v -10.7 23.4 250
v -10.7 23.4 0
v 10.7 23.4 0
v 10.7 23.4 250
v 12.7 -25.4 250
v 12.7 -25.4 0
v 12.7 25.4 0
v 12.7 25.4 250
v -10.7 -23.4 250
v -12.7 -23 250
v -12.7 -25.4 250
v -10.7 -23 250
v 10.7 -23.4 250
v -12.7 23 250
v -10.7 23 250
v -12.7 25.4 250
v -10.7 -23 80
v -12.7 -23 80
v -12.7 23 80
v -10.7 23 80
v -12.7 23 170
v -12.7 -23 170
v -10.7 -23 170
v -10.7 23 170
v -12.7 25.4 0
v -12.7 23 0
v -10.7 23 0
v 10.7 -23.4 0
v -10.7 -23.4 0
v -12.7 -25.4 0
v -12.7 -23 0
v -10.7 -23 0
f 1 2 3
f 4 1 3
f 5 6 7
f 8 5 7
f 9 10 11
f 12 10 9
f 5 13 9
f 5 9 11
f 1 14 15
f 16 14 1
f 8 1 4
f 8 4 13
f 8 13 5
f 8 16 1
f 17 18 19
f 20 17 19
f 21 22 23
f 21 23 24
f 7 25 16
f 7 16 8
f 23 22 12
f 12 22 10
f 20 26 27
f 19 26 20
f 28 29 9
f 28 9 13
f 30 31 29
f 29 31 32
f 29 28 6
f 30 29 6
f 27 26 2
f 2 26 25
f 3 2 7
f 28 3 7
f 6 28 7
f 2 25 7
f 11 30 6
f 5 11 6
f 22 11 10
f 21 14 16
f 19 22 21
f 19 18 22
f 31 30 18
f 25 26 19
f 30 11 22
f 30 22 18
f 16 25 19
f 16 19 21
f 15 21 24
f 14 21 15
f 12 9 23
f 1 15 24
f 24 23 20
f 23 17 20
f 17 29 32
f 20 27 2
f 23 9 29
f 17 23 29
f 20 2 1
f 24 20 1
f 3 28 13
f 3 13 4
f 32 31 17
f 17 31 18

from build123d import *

# Parameters (mm, degrees)
SKETCH1_W           = 25.4
SKETCH1_H           = 50.8
SKETCH1_W_2         = 21.4
SKETCH1_H_2         = 46.8
BOSS_EXTRUDE1_DEPTH = 250
SKETCH2_W           = 80
SKETCH2_H           = 46
CUT_EXTRUDE1_DEPTH  = 20


with BuildPart() as part:
    # Sketch1 → Boss-Extrude1 (new body)
    with BuildSketch(Plane.XY):
        Rectangle(SKETCH1_W, SKETCH1_H)
        Rectangle(SKETCH1_W_2, SKETCH1_H_2, mode=Mode.SUBTRACT)
    extrude(amount=BOSS_EXTRUDE1_DEPTH)

    # Sketch2 → Cut-Extrude1 (cut)
    with BuildSketch(Plane.ZY.offset(12.7)):
        with Locations((40, 0)):
            Rectangle(SKETCH2_W, SKETCH2_H)
        with Locations((210, 0)):
            Rectangle(SKETCH2_W, SKETCH2_H)
    extrude(amount=-CUT_EXTRUDE1_DEPTH, mode=Mode.SUBTRACT)


solid = part.part
